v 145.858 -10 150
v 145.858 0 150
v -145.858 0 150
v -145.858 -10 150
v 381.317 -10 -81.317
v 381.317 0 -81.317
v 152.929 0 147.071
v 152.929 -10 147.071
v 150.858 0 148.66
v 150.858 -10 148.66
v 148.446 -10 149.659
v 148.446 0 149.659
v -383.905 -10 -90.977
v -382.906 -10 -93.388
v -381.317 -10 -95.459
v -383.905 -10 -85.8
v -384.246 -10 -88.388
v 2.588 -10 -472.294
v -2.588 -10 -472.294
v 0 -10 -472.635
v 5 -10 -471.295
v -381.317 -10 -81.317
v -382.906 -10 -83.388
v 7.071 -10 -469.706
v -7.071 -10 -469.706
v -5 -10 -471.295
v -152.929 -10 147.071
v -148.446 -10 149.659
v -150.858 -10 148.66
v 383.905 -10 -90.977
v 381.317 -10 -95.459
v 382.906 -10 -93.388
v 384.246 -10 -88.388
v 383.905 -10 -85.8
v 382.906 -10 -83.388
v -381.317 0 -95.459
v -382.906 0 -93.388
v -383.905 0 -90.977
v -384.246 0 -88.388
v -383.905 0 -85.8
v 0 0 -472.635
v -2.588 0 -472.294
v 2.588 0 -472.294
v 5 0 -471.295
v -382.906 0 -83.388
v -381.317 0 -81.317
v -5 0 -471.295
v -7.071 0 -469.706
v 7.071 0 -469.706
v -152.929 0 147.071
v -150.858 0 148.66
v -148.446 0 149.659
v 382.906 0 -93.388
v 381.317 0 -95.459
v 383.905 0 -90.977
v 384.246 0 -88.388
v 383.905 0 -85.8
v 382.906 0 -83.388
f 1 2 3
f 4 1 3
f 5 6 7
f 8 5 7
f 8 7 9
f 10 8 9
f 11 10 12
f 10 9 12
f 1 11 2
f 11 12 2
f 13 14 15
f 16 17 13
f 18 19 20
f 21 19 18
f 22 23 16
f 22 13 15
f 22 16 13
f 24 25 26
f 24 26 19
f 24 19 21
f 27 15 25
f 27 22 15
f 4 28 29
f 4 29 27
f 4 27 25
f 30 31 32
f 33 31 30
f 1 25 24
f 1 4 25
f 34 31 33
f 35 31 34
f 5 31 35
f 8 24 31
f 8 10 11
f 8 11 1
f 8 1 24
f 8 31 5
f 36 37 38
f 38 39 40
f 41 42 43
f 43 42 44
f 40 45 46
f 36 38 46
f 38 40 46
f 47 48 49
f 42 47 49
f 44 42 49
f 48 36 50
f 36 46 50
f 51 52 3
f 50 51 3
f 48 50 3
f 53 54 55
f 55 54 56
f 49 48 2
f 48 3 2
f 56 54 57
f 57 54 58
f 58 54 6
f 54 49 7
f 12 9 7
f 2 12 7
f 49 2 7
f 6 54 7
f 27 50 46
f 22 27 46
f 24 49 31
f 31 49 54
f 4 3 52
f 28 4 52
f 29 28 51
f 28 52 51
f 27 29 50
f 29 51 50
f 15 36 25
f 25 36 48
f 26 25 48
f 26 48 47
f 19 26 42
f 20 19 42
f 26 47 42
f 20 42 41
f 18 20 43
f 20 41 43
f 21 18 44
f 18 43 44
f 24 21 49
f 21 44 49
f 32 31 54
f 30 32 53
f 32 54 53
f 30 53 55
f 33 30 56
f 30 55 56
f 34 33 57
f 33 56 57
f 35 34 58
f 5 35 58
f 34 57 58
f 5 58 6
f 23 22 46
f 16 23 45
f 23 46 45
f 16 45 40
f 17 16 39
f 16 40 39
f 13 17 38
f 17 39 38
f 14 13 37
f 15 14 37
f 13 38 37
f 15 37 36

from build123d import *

# Parameters (mm, degrees)
F1_DEPTH = 10


# Not quite as in the source:
# - a feature names something its author has since deleted; it is built from what else it names


with BuildPart() as f1:
    # F0 (on Front) → F1 (new body)
    with BuildSketch(Plane.XZ):
        with BuildLine():
            Line((-152.9289321881, 147.0710678119), (-300, 0))
            Line((-300, 0), (-381.3172798365, -81.3172798365))
            ThreePointArc((-381.3172798365, -81.3172798365), (-384.2462120246, -88.3883476483), (-381.3172798365, -95.4594154602))
            Line((-381.3172798365, -95.4594154602), (-155.0431098568, -321.7335854399))
            Line((-155.0431098568, -321.7335854399), (-7.0710678119, -469.7056274848))
            ThreePointArc((-7.0710678119, -469.7056274848), (0, -472.6345596729), (7.0710678119, -469.7056274848))
            Line((7.0710678119, -469.7056274848), (155.0431098568, -321.7335854399))
            Line((155.0431098568, -321.7335854399), (381.3172798365, -95.4594154602))
            ThreePointArc((381.3172798365, -95.4594154602), (384.2462120246, -88.3883476483), (381.3172798365, -81.3172798365))
            Line((381.3172798365, -81.3172798365), (300, 0))
            Line((300, 0), (152.9289321881, 147.0710678119))
            ThreePointArc((152.9289321881, 147.0710678119), (149.6846986999, 149.2387953251), (145.8578643763, 150))
            Line((145.8578643763, 150), (-145.8578643763, 150))
            ThreePointArc((-145.8578643763, 150), (-149.6846986999, 149.2387953251), (-152.9289321881, 147.0710678119))
        make_face()
    extrude(amount=F1_DEPTH)


solid = f1.part
